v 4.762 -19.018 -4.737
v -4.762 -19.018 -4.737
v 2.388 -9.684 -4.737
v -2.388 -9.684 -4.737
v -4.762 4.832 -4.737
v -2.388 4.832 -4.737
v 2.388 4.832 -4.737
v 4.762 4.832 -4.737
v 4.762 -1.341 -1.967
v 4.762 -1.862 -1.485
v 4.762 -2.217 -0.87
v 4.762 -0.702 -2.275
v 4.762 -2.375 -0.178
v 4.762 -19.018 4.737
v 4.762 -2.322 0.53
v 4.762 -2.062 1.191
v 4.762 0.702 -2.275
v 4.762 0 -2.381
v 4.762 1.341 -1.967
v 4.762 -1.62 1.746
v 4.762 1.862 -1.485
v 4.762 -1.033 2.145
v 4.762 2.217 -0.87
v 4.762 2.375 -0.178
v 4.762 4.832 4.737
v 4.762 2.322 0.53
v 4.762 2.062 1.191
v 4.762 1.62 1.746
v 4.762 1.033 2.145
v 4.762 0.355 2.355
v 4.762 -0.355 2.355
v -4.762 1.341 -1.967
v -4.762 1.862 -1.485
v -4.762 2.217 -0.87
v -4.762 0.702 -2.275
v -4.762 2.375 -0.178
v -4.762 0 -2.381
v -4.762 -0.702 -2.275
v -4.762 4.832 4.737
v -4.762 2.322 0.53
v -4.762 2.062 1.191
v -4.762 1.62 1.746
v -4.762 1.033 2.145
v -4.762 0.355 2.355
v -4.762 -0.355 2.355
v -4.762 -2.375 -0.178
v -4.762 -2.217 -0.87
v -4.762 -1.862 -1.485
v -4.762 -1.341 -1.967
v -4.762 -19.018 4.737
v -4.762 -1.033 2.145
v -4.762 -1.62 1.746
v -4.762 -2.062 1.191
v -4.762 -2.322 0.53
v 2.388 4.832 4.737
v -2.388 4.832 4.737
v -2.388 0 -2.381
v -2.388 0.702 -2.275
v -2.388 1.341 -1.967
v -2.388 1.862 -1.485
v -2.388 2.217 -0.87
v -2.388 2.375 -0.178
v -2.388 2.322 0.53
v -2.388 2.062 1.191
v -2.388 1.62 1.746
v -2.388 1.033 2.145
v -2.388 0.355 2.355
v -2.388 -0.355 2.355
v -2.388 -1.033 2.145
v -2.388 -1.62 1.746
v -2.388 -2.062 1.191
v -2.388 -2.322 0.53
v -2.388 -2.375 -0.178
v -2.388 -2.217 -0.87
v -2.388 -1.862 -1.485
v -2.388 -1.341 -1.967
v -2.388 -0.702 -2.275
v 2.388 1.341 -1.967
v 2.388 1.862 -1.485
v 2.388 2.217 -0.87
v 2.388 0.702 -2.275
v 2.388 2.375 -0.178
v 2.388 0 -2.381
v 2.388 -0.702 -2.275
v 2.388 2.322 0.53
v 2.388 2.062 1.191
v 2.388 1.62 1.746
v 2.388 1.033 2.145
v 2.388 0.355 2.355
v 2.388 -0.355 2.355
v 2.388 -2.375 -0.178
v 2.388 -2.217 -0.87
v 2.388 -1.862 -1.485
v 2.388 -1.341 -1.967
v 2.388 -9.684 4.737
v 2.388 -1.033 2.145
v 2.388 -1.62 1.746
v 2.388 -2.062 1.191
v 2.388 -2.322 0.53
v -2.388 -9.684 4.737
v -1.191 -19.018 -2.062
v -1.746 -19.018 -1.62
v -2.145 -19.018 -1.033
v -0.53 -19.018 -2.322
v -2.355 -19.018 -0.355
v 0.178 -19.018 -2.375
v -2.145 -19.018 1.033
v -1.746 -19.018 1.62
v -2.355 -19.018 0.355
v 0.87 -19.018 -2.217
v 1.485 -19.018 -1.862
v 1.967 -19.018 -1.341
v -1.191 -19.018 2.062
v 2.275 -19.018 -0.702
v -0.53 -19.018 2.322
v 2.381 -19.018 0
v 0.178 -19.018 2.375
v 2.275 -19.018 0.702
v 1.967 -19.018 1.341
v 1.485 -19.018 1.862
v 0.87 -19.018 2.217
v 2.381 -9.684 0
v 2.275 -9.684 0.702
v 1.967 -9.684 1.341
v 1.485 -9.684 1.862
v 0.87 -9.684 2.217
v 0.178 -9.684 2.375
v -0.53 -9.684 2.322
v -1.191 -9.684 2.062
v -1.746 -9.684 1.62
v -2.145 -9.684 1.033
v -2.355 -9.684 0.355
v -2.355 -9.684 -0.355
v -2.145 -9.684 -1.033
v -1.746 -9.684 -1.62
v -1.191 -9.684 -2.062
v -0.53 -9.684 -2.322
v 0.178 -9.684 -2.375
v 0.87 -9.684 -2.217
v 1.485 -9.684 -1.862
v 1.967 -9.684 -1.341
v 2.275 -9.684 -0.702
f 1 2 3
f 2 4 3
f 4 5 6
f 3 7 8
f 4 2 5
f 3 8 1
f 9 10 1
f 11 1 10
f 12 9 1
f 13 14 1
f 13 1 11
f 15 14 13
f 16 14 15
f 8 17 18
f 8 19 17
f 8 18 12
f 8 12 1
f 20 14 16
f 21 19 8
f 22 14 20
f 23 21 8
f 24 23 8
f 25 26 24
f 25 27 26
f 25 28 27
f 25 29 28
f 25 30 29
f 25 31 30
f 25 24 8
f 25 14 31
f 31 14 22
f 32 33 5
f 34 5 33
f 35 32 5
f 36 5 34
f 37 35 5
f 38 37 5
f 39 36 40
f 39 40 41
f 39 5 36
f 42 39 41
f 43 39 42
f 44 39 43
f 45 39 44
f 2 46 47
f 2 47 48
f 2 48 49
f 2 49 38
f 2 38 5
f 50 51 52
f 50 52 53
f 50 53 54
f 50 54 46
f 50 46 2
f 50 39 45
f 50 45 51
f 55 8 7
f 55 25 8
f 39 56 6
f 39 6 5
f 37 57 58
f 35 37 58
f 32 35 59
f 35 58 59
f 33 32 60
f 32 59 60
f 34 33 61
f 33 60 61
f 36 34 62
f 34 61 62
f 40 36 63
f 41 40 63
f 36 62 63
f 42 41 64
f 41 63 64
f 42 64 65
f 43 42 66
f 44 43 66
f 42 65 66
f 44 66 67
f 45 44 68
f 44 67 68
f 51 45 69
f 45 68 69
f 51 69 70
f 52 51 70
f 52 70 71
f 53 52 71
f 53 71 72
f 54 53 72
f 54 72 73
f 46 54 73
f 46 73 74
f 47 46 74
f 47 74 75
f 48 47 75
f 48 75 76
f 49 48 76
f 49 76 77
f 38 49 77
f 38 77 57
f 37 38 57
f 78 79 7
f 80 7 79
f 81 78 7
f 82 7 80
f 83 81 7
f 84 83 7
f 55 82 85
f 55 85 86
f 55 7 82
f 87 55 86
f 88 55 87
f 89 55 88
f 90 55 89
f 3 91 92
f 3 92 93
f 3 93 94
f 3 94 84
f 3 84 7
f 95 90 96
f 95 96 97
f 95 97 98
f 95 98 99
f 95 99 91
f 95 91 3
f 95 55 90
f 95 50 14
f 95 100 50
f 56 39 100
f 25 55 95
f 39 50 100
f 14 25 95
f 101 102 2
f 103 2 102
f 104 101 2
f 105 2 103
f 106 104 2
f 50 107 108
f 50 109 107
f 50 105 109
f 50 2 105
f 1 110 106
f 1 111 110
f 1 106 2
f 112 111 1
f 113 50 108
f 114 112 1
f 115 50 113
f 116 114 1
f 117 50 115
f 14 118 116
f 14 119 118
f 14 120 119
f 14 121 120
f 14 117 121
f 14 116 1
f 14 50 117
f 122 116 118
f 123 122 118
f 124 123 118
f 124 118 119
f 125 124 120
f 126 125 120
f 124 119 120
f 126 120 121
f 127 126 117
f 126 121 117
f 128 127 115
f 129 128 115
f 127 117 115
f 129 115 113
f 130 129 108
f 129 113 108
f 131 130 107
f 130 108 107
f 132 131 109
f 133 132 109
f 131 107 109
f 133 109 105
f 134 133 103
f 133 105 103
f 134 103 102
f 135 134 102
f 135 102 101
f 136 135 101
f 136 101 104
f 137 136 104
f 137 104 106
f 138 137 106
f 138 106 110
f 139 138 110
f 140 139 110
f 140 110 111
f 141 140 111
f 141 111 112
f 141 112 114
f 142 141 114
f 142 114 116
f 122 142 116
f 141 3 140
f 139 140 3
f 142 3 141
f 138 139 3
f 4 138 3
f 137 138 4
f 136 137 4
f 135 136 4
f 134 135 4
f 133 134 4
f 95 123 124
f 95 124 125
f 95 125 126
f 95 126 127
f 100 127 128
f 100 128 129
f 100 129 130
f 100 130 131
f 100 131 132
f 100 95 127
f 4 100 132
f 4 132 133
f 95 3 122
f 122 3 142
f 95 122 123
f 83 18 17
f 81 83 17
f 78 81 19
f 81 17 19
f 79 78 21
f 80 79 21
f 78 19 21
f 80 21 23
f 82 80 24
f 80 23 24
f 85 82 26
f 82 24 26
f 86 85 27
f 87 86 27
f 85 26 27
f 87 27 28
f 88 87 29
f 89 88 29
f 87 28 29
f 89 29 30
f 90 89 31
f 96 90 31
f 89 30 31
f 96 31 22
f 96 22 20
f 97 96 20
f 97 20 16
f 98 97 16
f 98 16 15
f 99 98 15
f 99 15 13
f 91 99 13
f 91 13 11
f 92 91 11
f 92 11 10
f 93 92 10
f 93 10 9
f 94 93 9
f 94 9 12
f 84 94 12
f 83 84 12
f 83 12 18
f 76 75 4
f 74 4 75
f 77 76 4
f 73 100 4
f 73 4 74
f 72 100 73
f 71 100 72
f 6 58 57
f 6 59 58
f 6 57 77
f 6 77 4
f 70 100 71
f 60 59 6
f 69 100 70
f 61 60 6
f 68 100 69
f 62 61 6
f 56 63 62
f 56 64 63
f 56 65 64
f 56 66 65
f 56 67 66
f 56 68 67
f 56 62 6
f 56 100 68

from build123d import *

# Parameters (mm, degrees)
BOSS_EXTRUDE1_DEPTH = 4.7371
CUT_EXTRUDE1_REACH  = 25.851
SKETCH4_R           = 2.38125
SKETCH5_R           = 2.38125
CUT_EXTRUDE2_DEPTH  = 10.525


with BuildPart() as part:
    # Sketch3 → Boss-Extrude1 (new body, symmetric)
    with BuildSketch(Plane.XY):
        Polygon((2.3876, -9.68375), (-2.3876, -9.68375), (-2.3876, 4.83235), (-4.7625, 4.83235), (-4.7625, -19.01825), (4.7625, -19.01825), (4.7625, 4.83235), (2.3876, 4.83235), align=None)
    extrude(amount=BOSS_EXTRUDE1_DEPTH, both=True)

    # Sketch4 → Cut-Extrude1 (cut, up to next)
    with BuildSketch(Plane.XZ.offset(19.01825), mode=Mode.PRIVATE) as cut_extrude1_sk1:
        Circle(SKETCH4_R)
    cut_extrude1_tool1 = extrude(cut_extrude1_sk1.sketch, amount=-CUT_EXTRUDE1_REACH, mode=Mode.PRIVATE) & part.part
    add(cut_extrude1_tool1.solids().sort_by_distance((0, -19.01825, 0))[0], mode=Mode.SUBTRACT)

    # Sketch5 → Cut-Extrude2 (cut, through all)
    with BuildSketch(Plane(origin=(4.7625, 0, 0), x_dir=(0, 0, -1), z_dir=(1, 0, 0))):
        Circle(SKETCH5_R)
    extrude(amount=-CUT_EXTRUDE2_DEPTH, mode=Mode.SUBTRACT)


solid = part.part
